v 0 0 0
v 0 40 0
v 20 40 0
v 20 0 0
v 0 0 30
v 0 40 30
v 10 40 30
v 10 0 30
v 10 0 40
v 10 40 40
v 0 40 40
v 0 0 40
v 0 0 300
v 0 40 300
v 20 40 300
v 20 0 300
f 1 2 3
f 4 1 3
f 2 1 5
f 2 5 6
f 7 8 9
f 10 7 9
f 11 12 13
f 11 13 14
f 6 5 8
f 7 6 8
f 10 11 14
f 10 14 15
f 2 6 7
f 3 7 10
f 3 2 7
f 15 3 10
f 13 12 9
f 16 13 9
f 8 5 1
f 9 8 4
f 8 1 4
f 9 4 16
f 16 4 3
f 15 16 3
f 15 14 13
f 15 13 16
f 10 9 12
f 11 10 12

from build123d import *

# Parameters (mm, degrees)
ESQUISSE1_W                  = 20
ESQUISSE1_H                  = 40
BOSS_EXTRU_1_DEPTH           = 300
ENL_V_MAT_EXTRU_1_DEPTH      = 1
ENL_V_MAT_EXTRU_1_DEPTH_BACK = 41


with BuildPart() as part:
    # Esquisse1 → Boss.-Extru.1 (new body)
    with BuildSketch(Plane.XY):
        with Locations((10, 20)):
            Rectangle(ESQUISSE1_W, ESQUISSE1_H)
    extrude(amount=BOSS_EXTRU_1_DEPTH)

    # Esquisse2 → Enlèv. mat.-Extru.1 (cut, two sides)
    with BuildSketch(Plane.XZ) as enl_v_mat_extru_1_sk:
        Polygon((-551.479454827, 30), (0, 30), (10, 30), (10, 40), (0, 40), (-551.479454827, 40), (-1654.438364482, 40), (-1654.438364482, 30), align=None)
    extrude(amount=ENL_V_MAT_EXTRU_1_DEPTH, mode=Mode.SUBTRACT)
    extrude(enl_v_mat_extru_1_sk.sketch, amount=-ENL_V_MAT_EXTRU_1_DEPTH_BACK, mode=Mode.SUBTRACT)


solid = part.part
